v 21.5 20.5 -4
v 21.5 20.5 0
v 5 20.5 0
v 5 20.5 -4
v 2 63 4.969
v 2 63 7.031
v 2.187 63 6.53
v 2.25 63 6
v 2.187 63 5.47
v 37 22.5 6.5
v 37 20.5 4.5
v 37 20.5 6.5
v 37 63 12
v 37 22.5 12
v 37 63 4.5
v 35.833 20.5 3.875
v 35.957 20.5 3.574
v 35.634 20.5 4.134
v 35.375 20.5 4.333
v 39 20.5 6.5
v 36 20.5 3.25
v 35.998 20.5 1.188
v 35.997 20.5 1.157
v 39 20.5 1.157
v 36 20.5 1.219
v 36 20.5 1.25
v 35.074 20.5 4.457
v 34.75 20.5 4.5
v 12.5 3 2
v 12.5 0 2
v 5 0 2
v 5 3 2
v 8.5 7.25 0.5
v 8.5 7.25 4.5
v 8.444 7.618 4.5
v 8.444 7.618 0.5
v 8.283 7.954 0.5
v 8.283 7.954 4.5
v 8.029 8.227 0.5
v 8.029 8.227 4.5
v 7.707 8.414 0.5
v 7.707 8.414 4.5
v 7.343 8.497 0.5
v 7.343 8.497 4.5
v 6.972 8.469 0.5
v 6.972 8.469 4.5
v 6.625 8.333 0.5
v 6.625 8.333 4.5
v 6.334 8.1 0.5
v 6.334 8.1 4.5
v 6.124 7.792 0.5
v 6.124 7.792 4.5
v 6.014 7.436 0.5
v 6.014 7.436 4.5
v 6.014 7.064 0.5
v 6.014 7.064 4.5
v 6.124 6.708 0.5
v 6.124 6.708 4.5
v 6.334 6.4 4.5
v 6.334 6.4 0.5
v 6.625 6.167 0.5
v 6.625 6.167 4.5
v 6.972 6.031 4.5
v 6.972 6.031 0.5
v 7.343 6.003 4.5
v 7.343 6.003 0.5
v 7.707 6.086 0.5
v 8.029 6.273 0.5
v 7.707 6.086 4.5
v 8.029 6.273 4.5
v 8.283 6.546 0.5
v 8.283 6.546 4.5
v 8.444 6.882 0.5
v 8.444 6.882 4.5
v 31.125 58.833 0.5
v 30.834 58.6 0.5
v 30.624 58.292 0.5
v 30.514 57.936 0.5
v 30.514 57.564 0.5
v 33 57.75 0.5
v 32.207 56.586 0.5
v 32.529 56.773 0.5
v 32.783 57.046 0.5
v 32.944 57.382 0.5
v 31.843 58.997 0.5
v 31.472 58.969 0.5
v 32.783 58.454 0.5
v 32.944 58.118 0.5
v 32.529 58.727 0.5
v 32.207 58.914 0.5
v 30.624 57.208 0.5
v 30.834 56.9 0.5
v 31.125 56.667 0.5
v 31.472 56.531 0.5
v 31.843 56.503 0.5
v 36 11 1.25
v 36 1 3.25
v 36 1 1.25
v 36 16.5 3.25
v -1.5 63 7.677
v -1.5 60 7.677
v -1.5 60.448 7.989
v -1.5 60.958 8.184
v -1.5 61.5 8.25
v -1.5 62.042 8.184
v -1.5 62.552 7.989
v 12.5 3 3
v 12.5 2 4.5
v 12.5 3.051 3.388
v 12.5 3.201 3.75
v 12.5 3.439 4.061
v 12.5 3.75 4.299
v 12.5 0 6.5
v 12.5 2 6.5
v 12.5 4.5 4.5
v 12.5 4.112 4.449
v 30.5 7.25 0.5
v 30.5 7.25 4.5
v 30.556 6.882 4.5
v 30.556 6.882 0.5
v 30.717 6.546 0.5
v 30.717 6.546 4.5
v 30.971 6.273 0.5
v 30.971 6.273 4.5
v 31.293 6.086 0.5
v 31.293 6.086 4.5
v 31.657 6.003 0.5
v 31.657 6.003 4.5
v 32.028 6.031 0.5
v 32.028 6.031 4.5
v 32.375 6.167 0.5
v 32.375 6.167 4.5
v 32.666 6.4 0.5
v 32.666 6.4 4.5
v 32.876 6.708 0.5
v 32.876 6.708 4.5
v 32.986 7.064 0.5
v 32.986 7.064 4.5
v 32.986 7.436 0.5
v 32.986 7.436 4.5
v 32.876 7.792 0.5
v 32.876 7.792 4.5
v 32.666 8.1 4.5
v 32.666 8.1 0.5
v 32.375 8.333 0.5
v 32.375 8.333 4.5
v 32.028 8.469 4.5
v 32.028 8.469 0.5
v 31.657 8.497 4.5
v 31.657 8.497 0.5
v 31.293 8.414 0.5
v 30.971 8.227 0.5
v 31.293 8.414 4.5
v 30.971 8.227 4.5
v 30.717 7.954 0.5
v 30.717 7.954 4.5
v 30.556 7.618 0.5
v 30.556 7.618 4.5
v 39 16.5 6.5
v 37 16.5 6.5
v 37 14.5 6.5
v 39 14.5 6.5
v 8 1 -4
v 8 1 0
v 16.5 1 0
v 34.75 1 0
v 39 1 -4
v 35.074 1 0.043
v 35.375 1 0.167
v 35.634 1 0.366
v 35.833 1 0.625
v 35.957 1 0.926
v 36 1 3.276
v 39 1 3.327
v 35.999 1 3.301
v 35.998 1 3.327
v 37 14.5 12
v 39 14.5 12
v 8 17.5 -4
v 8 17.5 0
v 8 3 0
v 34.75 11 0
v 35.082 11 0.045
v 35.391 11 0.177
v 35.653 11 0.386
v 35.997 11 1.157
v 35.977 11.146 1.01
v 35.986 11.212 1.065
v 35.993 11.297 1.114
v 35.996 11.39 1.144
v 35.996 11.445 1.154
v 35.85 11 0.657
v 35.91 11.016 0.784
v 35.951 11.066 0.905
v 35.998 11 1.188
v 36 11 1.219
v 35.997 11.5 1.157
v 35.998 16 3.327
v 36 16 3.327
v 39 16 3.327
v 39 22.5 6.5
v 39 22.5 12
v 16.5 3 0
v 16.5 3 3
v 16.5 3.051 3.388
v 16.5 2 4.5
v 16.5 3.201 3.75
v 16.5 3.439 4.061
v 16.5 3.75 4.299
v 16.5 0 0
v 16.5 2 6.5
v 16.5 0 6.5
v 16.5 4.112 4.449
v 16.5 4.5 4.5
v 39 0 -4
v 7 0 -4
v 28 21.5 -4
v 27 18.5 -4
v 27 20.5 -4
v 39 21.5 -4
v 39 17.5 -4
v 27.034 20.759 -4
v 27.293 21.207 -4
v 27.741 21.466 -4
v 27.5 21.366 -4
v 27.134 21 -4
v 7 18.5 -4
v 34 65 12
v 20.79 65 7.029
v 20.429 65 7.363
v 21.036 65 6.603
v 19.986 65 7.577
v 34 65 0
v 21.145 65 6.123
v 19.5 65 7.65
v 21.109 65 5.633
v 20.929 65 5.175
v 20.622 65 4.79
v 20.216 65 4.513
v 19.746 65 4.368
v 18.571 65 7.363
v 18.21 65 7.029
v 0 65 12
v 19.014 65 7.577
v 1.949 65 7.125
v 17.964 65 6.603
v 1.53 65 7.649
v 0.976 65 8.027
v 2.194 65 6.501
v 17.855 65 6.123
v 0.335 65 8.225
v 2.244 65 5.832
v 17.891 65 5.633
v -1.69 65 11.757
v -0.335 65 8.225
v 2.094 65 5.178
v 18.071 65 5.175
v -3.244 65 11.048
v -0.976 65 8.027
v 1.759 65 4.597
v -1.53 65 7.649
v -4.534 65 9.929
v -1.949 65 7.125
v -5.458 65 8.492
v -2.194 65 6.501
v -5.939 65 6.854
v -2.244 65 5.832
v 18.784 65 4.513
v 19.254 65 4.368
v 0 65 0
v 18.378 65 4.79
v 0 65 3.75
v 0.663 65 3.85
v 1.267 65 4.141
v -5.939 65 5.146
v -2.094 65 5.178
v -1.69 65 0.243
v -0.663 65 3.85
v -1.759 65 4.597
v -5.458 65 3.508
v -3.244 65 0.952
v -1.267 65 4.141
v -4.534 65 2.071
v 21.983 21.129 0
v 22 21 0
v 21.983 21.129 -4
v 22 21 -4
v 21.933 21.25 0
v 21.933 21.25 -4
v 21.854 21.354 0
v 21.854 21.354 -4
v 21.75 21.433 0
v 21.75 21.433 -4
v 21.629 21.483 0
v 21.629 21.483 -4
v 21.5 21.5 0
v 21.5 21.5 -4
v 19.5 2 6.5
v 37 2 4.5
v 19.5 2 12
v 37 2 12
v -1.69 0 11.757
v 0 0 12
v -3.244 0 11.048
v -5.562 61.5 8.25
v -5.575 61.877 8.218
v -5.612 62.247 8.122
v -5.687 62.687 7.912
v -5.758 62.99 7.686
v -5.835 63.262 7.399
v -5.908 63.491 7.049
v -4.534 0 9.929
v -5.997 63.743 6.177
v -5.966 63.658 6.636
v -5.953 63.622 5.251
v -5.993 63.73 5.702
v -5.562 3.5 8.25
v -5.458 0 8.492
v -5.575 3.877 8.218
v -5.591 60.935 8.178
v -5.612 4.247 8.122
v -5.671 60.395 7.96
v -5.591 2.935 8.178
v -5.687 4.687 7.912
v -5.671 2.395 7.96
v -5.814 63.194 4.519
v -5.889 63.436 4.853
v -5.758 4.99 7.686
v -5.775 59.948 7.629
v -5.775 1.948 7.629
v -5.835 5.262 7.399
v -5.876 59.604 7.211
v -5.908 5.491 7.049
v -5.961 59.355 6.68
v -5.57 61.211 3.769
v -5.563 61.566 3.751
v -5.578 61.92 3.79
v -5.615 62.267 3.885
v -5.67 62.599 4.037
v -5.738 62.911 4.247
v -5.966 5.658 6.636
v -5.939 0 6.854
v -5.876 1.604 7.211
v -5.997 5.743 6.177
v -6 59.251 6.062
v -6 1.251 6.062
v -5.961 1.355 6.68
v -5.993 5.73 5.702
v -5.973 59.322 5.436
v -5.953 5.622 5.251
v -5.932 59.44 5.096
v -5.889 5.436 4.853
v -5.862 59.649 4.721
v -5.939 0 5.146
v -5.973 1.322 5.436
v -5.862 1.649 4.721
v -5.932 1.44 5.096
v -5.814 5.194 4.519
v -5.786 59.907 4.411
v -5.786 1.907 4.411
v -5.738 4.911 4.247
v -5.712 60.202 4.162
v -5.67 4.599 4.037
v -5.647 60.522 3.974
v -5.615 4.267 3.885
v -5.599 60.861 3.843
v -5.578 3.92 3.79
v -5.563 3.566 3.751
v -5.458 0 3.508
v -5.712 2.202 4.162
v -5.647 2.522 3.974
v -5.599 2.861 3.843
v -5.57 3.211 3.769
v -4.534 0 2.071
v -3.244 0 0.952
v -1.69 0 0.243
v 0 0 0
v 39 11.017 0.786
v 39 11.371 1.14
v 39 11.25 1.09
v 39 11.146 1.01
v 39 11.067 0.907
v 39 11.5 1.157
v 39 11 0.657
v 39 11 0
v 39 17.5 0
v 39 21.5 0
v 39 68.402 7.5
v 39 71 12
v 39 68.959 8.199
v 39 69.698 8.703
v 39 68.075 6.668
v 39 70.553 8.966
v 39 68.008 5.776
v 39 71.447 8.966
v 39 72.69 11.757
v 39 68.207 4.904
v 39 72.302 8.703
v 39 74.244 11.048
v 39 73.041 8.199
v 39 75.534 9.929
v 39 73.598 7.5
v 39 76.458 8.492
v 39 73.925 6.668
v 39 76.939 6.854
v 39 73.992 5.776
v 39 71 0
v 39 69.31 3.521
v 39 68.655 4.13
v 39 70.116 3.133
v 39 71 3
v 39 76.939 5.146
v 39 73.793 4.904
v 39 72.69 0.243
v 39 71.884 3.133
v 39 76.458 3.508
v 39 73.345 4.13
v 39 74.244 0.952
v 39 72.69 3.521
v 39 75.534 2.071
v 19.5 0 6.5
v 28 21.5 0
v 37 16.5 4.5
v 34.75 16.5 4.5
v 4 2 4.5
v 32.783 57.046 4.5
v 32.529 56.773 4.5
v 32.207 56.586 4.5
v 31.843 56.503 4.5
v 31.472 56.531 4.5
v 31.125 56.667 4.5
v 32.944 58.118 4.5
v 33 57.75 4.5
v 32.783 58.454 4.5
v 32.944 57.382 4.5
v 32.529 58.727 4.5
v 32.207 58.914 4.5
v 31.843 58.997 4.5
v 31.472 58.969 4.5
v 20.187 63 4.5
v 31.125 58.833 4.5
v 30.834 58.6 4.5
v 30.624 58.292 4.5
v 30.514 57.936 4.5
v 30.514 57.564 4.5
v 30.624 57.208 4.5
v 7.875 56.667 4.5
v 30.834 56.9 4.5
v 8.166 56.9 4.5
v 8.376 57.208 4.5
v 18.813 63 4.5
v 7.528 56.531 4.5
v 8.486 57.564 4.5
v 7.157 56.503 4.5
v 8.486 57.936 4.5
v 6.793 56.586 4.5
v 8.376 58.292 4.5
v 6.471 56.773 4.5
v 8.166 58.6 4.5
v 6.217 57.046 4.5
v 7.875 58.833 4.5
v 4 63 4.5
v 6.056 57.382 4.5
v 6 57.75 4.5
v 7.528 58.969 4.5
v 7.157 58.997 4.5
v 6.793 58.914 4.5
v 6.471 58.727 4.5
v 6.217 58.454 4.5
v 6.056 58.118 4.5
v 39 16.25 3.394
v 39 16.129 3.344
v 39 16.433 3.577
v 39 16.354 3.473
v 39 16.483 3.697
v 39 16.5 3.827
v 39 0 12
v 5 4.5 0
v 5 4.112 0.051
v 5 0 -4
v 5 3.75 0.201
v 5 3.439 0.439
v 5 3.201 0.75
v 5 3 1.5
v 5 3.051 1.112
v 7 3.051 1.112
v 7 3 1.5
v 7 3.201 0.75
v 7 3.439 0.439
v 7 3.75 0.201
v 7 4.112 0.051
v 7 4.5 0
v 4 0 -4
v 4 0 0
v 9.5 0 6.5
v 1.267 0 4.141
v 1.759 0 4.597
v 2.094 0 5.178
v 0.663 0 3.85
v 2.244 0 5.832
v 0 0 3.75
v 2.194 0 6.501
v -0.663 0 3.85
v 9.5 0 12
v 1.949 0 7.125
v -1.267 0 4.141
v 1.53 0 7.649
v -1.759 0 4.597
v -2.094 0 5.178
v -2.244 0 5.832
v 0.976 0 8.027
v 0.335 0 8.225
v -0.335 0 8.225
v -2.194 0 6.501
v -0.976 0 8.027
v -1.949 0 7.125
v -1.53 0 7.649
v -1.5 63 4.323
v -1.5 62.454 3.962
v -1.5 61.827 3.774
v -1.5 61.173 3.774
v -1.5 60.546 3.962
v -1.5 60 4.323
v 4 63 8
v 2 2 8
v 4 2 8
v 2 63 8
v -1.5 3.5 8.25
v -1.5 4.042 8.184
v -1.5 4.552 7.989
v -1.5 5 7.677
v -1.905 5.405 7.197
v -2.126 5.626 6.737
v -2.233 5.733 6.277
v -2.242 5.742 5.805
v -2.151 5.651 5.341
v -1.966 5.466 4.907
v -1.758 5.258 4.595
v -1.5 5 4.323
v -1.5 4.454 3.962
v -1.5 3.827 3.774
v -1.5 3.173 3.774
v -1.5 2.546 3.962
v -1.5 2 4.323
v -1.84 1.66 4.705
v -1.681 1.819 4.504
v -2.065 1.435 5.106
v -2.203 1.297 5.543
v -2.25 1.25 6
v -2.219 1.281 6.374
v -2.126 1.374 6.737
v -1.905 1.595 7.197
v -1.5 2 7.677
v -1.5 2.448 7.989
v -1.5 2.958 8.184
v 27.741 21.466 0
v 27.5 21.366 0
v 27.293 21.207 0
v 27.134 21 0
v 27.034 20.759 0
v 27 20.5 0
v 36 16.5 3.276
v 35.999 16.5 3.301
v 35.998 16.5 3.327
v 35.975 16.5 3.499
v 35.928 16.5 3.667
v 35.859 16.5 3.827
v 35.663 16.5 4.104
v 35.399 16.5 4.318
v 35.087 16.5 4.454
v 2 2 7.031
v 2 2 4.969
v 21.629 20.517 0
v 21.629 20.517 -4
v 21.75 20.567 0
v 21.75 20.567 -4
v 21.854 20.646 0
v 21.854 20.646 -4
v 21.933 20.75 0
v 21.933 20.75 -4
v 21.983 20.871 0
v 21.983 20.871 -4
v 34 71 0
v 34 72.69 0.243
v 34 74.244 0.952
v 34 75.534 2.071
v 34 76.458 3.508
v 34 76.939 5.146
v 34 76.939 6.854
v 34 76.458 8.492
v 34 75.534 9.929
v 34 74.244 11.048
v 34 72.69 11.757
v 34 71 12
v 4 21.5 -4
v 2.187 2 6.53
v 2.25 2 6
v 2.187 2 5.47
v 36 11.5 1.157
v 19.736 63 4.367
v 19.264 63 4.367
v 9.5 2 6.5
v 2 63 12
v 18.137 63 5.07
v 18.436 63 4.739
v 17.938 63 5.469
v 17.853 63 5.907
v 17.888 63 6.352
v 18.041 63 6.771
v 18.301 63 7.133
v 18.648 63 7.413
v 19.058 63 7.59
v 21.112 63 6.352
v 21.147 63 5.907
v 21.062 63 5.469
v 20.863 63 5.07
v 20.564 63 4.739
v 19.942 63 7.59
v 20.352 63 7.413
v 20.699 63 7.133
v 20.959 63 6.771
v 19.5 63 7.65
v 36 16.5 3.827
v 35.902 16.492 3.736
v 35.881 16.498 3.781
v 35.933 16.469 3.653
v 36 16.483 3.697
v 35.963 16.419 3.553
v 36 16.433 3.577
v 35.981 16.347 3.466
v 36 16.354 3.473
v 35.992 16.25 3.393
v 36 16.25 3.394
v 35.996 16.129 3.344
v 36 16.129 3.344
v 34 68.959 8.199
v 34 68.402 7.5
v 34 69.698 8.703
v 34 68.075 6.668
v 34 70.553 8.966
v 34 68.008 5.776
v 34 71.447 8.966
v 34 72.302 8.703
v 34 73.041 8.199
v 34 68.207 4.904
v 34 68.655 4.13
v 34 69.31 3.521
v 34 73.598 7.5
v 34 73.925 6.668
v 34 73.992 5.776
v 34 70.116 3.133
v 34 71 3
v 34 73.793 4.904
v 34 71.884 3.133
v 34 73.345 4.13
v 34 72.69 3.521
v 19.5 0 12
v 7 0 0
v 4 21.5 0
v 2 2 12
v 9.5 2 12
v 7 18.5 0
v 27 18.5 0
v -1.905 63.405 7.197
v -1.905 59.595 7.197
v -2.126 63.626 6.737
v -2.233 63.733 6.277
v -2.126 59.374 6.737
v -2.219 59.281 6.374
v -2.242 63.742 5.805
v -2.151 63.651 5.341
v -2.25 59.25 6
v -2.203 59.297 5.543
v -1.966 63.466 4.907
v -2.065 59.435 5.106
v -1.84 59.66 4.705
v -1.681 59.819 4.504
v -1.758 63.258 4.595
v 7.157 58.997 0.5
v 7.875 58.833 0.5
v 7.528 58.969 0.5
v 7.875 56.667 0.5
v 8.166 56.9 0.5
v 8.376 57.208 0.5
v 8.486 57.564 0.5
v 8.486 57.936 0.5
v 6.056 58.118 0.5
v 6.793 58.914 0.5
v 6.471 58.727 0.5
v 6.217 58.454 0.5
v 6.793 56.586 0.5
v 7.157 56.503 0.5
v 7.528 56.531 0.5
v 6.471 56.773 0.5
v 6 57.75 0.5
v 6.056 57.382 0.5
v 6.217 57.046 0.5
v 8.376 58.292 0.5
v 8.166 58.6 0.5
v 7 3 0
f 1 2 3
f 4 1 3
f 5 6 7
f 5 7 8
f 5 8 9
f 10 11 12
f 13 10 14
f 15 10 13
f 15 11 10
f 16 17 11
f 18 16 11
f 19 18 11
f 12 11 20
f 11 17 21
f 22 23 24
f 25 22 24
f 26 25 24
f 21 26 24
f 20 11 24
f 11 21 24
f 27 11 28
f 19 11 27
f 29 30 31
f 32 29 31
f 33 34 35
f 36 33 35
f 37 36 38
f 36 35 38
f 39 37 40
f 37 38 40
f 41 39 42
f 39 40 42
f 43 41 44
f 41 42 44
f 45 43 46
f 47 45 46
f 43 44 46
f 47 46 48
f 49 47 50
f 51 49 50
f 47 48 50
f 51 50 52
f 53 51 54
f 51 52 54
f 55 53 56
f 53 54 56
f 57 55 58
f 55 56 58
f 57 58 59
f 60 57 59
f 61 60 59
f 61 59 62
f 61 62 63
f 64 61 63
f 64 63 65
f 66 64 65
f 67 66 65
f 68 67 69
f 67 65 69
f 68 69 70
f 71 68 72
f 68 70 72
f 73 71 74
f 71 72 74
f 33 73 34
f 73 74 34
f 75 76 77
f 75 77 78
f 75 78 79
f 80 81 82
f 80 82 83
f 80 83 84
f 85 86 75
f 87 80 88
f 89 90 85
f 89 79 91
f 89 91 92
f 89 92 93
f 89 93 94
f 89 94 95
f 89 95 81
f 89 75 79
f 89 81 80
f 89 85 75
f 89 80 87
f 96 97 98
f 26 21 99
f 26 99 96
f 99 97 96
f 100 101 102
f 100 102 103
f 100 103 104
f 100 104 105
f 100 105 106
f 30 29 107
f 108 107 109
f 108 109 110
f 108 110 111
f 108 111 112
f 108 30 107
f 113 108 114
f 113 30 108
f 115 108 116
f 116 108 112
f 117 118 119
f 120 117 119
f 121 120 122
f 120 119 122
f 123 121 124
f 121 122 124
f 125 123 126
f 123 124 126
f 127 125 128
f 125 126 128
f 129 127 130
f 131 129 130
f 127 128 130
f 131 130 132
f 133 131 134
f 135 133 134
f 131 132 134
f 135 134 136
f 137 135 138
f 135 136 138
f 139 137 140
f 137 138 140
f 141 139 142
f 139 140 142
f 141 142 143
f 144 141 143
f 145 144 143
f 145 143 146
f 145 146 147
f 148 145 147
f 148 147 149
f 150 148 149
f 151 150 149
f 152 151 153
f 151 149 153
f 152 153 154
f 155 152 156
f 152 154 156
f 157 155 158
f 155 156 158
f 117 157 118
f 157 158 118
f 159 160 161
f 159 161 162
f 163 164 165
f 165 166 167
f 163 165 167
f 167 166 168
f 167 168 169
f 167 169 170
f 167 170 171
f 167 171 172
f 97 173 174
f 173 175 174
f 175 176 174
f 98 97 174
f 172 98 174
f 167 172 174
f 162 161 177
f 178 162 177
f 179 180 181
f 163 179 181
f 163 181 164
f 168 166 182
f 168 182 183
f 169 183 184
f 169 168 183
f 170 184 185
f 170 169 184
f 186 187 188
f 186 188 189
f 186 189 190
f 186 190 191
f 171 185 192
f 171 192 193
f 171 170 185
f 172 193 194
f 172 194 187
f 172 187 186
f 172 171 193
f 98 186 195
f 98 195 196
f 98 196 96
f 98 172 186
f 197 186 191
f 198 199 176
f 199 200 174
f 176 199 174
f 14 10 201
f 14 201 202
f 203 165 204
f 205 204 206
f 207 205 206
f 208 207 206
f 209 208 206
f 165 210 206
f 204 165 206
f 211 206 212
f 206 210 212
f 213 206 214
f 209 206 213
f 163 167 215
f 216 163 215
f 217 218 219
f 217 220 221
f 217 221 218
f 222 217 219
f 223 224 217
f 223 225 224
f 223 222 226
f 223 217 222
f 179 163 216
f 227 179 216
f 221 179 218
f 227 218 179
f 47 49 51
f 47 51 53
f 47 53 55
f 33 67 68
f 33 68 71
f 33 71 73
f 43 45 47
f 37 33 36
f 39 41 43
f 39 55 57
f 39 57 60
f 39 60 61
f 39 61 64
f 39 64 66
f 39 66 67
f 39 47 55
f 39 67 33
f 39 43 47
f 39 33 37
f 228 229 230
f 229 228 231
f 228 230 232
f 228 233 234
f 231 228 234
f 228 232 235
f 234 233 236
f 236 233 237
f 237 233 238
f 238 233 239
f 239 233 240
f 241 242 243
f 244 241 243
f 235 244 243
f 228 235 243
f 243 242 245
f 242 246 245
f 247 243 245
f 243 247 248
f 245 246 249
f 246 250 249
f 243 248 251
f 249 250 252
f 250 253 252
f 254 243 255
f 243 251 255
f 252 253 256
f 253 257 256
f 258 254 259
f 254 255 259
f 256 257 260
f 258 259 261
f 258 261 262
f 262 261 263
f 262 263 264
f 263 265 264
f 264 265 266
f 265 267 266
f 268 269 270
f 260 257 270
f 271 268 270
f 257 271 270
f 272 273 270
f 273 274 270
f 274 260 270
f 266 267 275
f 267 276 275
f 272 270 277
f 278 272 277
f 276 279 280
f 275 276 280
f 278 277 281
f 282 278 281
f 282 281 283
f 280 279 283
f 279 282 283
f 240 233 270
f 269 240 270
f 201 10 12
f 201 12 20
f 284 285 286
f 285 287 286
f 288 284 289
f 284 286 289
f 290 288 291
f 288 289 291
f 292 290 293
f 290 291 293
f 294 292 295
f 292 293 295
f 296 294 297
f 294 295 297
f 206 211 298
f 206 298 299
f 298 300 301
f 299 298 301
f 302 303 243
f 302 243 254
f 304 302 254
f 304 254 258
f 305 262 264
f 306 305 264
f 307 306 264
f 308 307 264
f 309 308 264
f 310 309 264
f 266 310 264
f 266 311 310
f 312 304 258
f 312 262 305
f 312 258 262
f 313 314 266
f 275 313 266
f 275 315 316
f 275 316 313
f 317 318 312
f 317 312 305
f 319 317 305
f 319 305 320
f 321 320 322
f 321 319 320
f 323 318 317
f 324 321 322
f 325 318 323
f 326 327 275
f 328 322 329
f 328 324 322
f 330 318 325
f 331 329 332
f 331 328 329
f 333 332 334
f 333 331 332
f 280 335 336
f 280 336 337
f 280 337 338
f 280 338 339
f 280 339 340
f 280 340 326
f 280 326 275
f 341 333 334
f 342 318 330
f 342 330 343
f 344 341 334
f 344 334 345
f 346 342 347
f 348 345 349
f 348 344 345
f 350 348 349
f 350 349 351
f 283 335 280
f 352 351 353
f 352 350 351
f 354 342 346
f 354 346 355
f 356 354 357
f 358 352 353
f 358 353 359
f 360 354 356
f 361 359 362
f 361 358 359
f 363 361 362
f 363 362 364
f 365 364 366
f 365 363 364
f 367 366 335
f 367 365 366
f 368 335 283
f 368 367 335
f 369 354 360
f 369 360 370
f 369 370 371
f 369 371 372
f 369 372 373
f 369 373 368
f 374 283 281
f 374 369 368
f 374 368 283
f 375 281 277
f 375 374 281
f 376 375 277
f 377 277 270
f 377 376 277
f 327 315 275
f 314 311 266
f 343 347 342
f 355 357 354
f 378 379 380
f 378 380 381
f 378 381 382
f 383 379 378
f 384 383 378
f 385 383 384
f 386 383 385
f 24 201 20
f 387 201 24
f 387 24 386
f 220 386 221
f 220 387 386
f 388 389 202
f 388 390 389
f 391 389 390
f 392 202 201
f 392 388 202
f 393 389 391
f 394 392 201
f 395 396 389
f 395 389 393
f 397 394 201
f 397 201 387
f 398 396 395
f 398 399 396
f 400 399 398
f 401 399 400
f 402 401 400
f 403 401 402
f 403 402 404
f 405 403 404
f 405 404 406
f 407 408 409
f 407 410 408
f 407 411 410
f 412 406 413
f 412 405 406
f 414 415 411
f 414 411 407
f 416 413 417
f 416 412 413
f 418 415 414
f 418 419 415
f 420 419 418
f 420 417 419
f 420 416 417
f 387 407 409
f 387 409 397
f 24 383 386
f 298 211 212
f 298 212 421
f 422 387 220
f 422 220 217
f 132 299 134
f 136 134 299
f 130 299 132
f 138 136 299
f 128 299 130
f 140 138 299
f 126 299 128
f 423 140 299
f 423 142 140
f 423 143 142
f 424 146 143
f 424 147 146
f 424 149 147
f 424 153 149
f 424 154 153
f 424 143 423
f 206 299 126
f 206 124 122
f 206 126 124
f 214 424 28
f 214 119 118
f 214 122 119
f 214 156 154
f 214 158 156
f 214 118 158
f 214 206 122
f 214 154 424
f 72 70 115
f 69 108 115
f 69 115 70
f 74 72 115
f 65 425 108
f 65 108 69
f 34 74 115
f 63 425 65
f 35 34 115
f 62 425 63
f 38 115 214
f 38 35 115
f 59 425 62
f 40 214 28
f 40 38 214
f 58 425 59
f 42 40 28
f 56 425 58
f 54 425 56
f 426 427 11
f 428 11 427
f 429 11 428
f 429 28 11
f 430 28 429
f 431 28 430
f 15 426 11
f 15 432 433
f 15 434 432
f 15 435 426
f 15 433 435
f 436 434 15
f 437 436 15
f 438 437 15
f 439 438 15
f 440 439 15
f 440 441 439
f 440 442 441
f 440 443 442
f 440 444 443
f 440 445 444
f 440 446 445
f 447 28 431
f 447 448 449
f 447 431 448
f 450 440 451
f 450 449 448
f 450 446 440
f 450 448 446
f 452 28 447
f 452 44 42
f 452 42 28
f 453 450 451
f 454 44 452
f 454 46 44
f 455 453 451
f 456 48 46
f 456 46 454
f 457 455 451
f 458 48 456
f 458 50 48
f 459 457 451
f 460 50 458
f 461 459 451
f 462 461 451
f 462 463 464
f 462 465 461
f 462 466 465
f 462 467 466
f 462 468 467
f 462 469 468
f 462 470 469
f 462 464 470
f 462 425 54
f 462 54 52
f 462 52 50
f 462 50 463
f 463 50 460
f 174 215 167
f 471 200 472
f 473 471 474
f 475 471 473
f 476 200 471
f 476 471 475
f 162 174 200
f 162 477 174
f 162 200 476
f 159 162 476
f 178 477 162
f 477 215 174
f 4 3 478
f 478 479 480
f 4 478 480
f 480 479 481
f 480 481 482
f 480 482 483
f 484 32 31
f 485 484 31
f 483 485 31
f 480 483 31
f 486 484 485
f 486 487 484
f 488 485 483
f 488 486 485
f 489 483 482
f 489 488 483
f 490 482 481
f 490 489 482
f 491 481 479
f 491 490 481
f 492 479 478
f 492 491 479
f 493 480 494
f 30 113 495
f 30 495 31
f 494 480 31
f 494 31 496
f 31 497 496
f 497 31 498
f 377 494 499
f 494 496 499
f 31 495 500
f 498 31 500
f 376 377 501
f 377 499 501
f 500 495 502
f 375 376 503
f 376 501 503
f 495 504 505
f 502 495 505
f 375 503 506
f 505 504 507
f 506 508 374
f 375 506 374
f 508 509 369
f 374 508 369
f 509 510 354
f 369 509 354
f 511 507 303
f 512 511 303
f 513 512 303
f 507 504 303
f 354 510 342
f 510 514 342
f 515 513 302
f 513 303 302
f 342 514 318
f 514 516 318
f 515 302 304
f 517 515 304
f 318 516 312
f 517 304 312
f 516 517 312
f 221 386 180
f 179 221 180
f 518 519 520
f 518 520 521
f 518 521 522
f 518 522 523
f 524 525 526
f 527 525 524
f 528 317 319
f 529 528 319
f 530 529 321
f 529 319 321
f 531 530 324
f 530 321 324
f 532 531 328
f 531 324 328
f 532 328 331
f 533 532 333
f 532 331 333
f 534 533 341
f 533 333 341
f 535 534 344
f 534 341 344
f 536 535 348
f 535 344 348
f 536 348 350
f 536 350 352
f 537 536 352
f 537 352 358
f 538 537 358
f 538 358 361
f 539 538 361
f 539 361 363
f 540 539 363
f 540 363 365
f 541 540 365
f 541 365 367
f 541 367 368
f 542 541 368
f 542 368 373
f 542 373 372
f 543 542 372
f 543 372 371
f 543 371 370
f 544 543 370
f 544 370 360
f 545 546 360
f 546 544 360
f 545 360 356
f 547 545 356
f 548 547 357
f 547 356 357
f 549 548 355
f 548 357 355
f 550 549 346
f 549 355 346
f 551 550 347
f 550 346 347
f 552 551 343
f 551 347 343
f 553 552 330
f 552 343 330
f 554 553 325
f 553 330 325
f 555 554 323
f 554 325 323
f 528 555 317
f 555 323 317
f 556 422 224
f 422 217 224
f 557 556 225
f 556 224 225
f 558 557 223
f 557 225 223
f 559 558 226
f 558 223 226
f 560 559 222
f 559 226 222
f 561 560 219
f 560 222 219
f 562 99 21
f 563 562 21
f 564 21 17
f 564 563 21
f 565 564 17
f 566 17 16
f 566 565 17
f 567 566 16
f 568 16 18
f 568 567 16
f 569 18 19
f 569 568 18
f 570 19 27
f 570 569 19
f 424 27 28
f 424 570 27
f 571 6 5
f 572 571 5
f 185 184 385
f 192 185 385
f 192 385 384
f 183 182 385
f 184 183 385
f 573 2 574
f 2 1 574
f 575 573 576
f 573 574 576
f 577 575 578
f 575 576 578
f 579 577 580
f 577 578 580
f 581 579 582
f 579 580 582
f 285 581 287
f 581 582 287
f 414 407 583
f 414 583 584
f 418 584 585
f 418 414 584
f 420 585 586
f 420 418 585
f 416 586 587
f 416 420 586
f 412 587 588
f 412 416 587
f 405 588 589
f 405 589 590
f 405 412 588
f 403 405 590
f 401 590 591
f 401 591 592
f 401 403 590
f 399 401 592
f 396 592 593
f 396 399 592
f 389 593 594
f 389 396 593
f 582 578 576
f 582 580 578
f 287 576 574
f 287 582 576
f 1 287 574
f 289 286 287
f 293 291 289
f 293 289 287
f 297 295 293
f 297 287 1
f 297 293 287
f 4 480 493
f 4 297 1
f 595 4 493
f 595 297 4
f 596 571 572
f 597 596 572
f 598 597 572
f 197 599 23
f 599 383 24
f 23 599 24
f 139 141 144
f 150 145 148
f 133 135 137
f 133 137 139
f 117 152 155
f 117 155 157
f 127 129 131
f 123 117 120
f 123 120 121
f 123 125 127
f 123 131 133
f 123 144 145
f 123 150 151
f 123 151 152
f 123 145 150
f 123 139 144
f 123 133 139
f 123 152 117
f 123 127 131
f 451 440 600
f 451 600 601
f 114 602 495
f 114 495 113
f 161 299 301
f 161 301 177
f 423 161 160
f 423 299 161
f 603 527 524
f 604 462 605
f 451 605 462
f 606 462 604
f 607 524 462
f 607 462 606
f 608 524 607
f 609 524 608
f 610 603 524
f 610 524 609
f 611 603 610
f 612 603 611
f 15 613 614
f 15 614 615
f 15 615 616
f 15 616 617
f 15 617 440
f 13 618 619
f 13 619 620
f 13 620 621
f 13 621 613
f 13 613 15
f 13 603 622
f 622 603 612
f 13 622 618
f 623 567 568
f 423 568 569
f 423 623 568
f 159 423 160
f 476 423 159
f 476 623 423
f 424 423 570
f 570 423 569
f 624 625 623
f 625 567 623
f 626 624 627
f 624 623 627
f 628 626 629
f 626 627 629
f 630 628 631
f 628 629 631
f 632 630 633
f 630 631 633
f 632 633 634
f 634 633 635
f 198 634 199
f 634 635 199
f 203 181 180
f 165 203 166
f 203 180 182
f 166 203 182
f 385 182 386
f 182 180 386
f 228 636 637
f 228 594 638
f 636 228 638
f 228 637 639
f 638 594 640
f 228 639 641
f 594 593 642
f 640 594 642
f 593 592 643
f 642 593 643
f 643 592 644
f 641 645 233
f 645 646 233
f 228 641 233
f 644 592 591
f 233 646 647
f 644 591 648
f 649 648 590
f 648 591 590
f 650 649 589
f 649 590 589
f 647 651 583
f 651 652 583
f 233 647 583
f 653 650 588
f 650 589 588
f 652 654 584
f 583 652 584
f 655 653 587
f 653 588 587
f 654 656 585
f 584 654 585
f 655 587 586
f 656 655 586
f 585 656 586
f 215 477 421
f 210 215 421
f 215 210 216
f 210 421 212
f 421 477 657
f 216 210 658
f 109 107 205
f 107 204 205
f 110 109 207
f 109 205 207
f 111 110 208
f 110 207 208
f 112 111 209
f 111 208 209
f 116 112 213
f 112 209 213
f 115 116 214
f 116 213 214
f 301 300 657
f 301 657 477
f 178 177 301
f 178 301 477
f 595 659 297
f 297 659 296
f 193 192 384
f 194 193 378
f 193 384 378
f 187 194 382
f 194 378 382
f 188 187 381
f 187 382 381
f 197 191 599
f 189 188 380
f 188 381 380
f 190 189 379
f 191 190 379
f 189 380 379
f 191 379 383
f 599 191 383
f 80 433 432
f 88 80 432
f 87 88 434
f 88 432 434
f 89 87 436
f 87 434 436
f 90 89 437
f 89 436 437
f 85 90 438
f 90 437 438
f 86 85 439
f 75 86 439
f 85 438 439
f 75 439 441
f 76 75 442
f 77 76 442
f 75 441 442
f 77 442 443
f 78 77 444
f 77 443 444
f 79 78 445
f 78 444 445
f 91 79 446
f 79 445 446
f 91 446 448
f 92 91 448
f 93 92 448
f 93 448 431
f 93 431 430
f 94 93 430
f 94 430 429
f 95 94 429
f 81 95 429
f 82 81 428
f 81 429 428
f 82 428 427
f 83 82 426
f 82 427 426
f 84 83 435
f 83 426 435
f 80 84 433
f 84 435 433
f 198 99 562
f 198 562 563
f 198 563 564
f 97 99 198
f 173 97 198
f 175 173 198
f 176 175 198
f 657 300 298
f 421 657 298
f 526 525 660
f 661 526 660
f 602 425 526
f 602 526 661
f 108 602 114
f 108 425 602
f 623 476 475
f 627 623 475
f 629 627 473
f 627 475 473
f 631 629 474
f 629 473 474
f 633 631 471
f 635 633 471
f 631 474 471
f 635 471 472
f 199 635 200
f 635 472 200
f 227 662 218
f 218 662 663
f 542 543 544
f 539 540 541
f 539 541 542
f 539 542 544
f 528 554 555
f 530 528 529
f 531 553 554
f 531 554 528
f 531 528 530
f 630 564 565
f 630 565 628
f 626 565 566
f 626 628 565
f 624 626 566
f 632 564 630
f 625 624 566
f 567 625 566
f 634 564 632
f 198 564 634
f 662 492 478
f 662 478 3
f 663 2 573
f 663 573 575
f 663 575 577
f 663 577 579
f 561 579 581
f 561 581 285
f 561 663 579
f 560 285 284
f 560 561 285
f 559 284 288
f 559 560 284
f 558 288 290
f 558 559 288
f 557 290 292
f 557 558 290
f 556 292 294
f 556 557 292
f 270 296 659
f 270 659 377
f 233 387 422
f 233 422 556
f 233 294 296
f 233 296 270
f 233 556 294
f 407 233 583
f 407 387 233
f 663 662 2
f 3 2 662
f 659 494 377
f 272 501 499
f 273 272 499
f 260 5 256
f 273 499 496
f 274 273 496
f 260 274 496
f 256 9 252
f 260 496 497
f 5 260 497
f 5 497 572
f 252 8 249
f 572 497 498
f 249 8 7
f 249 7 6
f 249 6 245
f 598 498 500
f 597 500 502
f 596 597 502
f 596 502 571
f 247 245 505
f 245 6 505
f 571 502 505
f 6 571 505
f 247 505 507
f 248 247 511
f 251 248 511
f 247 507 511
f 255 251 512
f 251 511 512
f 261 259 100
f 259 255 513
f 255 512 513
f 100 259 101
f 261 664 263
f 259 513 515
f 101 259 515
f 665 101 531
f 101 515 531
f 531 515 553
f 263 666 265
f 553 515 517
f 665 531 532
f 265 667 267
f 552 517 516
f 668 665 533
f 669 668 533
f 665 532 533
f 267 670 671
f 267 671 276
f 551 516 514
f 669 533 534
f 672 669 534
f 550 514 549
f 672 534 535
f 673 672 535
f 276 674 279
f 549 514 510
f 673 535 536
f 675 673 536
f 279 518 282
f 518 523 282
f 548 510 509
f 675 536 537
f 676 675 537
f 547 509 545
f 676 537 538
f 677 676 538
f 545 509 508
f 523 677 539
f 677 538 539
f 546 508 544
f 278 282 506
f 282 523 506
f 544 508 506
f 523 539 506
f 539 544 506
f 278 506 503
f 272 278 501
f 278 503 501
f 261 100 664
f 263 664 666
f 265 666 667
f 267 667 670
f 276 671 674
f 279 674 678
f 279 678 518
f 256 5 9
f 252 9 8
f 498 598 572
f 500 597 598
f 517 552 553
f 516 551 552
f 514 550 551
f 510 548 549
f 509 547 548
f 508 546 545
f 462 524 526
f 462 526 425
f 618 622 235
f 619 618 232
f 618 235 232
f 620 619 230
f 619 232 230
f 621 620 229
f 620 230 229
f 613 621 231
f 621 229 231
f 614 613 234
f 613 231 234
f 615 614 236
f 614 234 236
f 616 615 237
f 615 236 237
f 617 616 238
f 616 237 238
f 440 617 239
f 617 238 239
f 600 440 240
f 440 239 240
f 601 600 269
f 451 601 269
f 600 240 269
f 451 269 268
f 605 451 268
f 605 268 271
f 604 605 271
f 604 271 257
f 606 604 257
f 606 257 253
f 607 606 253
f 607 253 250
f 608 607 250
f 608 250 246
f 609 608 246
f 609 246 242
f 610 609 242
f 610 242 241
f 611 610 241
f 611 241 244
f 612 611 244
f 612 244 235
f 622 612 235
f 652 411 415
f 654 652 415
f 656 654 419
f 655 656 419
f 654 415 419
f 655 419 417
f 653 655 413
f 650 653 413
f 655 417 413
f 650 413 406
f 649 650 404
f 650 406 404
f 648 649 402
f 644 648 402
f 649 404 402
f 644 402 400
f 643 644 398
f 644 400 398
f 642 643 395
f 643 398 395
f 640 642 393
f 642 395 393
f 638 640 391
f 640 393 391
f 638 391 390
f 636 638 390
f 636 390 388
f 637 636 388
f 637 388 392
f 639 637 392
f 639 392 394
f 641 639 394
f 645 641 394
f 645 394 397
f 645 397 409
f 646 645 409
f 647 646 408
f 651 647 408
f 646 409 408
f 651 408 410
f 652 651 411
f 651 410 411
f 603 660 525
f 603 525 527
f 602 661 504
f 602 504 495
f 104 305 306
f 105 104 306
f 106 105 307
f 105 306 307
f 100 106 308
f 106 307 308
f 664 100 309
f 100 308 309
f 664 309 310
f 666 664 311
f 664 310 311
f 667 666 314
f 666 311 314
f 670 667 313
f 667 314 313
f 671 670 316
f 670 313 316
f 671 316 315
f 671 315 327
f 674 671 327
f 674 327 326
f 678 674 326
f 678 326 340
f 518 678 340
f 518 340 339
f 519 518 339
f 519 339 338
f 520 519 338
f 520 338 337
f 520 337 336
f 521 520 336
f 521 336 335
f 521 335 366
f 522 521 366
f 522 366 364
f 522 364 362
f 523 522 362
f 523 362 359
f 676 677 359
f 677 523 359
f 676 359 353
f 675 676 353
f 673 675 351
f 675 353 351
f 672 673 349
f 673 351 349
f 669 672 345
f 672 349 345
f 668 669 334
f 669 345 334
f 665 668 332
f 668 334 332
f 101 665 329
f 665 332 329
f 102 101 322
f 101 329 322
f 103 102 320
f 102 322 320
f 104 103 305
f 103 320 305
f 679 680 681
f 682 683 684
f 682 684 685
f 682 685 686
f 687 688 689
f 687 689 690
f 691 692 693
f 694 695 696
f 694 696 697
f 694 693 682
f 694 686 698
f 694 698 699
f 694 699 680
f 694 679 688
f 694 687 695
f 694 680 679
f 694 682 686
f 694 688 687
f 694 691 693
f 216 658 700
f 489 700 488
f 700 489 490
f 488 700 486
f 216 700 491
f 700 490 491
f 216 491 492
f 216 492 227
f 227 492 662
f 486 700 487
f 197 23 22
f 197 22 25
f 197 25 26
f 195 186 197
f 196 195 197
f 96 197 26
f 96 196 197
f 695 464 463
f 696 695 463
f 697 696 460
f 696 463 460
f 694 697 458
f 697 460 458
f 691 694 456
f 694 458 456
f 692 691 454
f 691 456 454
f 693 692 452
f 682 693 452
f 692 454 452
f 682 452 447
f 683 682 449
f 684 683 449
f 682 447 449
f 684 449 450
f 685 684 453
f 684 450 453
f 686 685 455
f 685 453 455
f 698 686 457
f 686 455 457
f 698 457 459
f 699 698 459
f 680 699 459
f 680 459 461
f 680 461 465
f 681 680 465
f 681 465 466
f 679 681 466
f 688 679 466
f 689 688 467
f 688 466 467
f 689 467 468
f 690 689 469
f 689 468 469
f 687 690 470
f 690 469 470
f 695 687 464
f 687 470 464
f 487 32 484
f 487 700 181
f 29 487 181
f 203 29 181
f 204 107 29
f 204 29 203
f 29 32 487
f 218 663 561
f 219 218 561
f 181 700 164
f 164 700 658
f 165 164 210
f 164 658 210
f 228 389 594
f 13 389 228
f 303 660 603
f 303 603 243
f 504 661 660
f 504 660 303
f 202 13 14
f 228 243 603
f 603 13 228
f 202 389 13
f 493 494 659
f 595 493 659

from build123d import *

# Parameters (mm, degrees)
SKETCH1_W                = 39
SKETCH1_H                = 65
BASE_DEPTH               = 4.5
SKETCH2_W                = 4
SKETCH2_H                = 57
WALLS_DEPTH              = 7.5
SKETCH3_W                = 10
SKETCH3_H                = 7.5
PWR_CONNECTOR_HOLE_DEPTH = 4
SKETCH4_W                = 7.5
SKETCH4_H                = 8
GPS_CONNECTOR_HOLE_DEPTH = 4
SKETCH5_R                = 1.25
MOUNTING_HOLES_DEPTH     = 4
GPS_MOUNT_DEPTH          = 4
SKETCH11_W               = 17
SKETCH11_H               = 1
SKETCH11_W_2             = 12
SKETCH11_H_2             = 3
PWR_CABLE_HOLDER1_DEPTH  = 4
SKETCH12_W               = 4
SKETCH12_H               = 2.5
PWR_CABLE_HOLDER2_DEPTH  = 3
PWR_FILLET_R             = 1.5
PWR_FILLET2_R            = 1
PWR_FILLET3_R            = 0.5
GPS_CABLE_HOLDER_DEPTH   = 3
GPS_START                = 1
GPS_FILLET_DEPTH         = 10
GPS_START_2              = 16.5
GPS_FILLET_2_DEPTH       = 4
GPS_START_3              = 9.15727
GPS_FILLET_3_DEPTH       = 8.34273
GPS_FILLET2_R            = 0.5
SKETCH15_R               = 6
BALLON_MOUNT_DEPTH       = 65
SKETCH16_R               = 2.25
BALLOON_MOUNT_HOLE_DEPTH = 65
SKETCH21_R               = 2.25
SAFETY_MOUNT_DEPTH       = 4.5
SKETCH22_W               = 35
SKETCH22_H               = 61
LID_HOLE_DEPTH           = 7.5
SKETCH25_W               = 3.5
SKETCH25_H               = 61
CORRECTION_DEPTH         = 2
SKETCH28_W               = 2
SKETCH28_H               = 2
SKETCH28_W_2             = 3
SMALL_WALLS_DEPTH        = 2
ANTENNA_MOUNTING_DEPTH   = 5
SKETCH30_R               = 3
ANTENNA_HOLE_DEPTH       = 5
SKETCH31_R               = 1.65
CABLE_HOLE_DEPTH         = 2


with BuildPart() as part:
    # Sketch1 → Base (new body)
    with BuildSketch(Plane.XY):
        with Locations((19.5, 32.5)):
            Rectangle(SKETCH1_W, SKETCH1_H)
    extrude(amount=BASE_DEPTH)

    # Sketch2 → Walls (add)
    with BuildSketch(Plane.XY.offset(4.5)):
        Polygon((39, 61), (39, 65), (0, 65), (0, 61), (4, 61), (35, 61), align=None)
        with Locations((37, 32.5)):
            Rectangle(SKETCH2_W, SKETCH2_H)
        Polygon((4, 61), (0, 61), (0, 0), (4, 0), (4, 4), align=None)
        Polygon((39, 0), (39, 4), (35, 4), (4, 4), (4, 0), align=None)
    extrude(amount=WALLS_DEPTH)

    # Sketch3 → PWR connector hole (cut)
    with BuildSketch(Plane(origin=(0, 4, 0), x_dir=(1, 0, 0), z_dir=(0, 1, 0))):
        with Locations((14.5, -8.25)):
            Rectangle(SKETCH3_W, SKETCH3_H)
    extrude(amount=-PWR_CONNECTOR_HOLE_DEPTH, mode=Mode.SUBTRACT)

    # Sketch4 → GPS connector hole (cut)
    with BuildSketch(Plane.ZY.offset(-35)):
        with Locations((8.25, 18.5)):
            Rectangle(SKETCH4_W, SKETCH4_H)
    extrude(amount=-GPS_CONNECTOR_HOLE_DEPTH, mode=Mode.SUBTRACT)

    # Sketch5 → Mounting holes (cut)
    with BuildSketch(Plane.XY.offset(4.5)):
        with Locations((7.25, 7.25)):
            Circle(SKETCH5_R)
        with Locations(Location((31.75, 7.25, 0), (0, 0, 180))):
            Circle(SKETCH5_R)
        with Locations(Location((7.25, 57.75, 0), (0, 0, 180))):
            Circle(SKETCH5_R)
        with Locations((31.75, 57.75)):
            Circle(SKETCH5_R)
    extrude(amount=-MOUNTING_HOLES_DEPTH, mode=Mode.SUBTRACT)

    # Sketch7 → GPS mount (add)
    with BuildSketch(Plane(origin=(0, 0, 0), x_dir=(-1, 0, 0), z_dir=(0, 0, -1))):
        Polygon((-39, 1), (-39, 0), (-7, 0), (-7, 18.5), (-39, 18.5), (-39, 17.5), (-8, 17.5), (-8, 1), align=None)
    extrude(amount=GPS_MOUNT_DEPTH)

    # Sketch11 → PWR cable holder1 (add)
    with BuildSketch(Plane(origin=(0, 0, 0), x_dir=(-1, 0, 0), z_dir=(0, 0, -1))):
        Polygon((-5, 0), (-4, 0), (-4, 21.5), (-5, 21.5), (-5, 20.5), align=None)
        with Locations((-13.5, 21)):
            Rectangle(SKETCH11_W, SKETCH11_H)
        with Locations((-33, 20)):
            Rectangle(SKETCH11_W_2, SKETCH11_H_2)
    extrude(amount=PWR_CABLE_HOLDER1_DEPTH)

    # Sketch12 → PWR cable holder2 (cut)
    with BuildSketch(Plane.XZ):
        Polygon((5, 2), (5, 0), (7, 0), (16.5, 0), (16.5, 2), (12.5, 2), align=None)
        with Locations((14.5, 3.25)):
            Rectangle(SKETCH12_W, SKETCH12_H)
    extrude(amount=-PWR_CABLE_HOLDER2_DEPTH, mode=Mode.SUBTRACT)

    # PWR fillet
    pwr_fillet_edges = [part.edges().sort_by_distance(p)[0] for p in [
        (6, 3, 0),
        (14.5, 3, 4.5),
    ]]
    fillet(pwr_fillet_edges, radius=PWR_FILLET_R)

    # PWR fillet2
    pwr_fillet2_edges = [part.edges().sort_by_distance(p)[0] for p in [
        (27, 21.5, -2),
    ]]
    fillet(pwr_fillet2_edges, radius=PWR_FILLET2_R)

    # PWR fillet3
    pwr_fillet3_edges = [part.edges().sort_by_distance(p)[0] for p in [
        (22, 21.5, -2),
        (22, 20.5, -2),
    ]]
    fillet(pwr_fillet3_edges, radius=PWR_FILLET3_R - 0.0001)  # a hair under: the kernel refuses the full size

    # Sketch13 → GPS cable holder (cut)
    with BuildSketch(Plane(origin=(39, 0, 0), x_dir=(0, 0, -1), z_dir=(1, 0, 0))):
        Polygon((-1.156586719, 11), (-2.326586719, 11), (-2.326586719, 1), (0, 1), (0, 11), align=None)
        Polygon((-2.326586719, 11), (-2.326586719, 16.5), (-3.326586719, 16.5), (-3.326586719, 1), (-2.326586719, 1), align=None)
        Polygon((-1.156586719, 20.5), (-2.326586719, 20.5), (-2.326586719, 16.5), (-2.326586719, 11), (-1.156586719, 11), align=None)
        Polygon((-2.326586719, 20.5), (-4.5, 20.5), (-4.5, 16.5), (-3.326586719, 16.5), (-2.326586719, 16.5), align=None)
    extrude(amount=-GPS_CABLE_HOLDER_DEPTH, mode=Mode.SUBTRACT)

    # GPS fillet: read off the stored shape, not the designer's step
    # GPS fillet outline → GPS fillet (cut)
    with BuildSketch(Plane(origin=(0, 0, 0), x_dir=(1, 0, 0), z_dir=(0, 1, 0)).offset(GPS_START)):
        with BuildLine():
            Line((36, -3.326586719), (36, -3.25))
            ThreePointArc((36, -3.25), (35.999412758, -3.288311358), (35.997651584, -3.326586719))
            Line((35.997651584, -3.326586719), (36, -3.326586719))
        make_face()
        with BuildLine():
            Line((36, -1.25), (36, 0))
            Line((36, 0), (34.75, 0))
            ThreePointArc((34.75, 0), (35.633883476, -0.366116524), (36, -1.25))
        make_face()
    extrude(amount=GPS_FILLET_DEPTH, mode=Mode.SUBTRACT)

    # GPS fillet 2 outline → GPS fillet 2 (cut)
    with BuildSketch(Plane(origin=(0, 0, 0), x_dir=(1, 0, 0), z_dir=(0, 1, 0)).offset(GPS_START_2)):
        with BuildLine():
            ThreePointArc((36, -3.25), (35.633883476, -4.133883476), (34.75, -4.5))
            Line((34.75, -4.5), (36, -4.5))
            Line((36, -4.5), (36, -3.25))
        make_face()
        with BuildLine():
            ThreePointArc((35.996504697, -1.156586719), (35.999125868, -1.203260674), (36, -1.25))
            Line((36, -1.25), (36, -1.156586719))
            Line((36, -1.156586719), (35.996504697, -1.156586719))
        make_face()
    extrude(amount=GPS_FILLET_2_DEPTH, mode=Mode.SUBTRACT)

    # GPS fillet 3 outline → GPS fillet 3 (cut)
    with BuildSketch(Plane(origin=(0, 0, 0), x_dir=(1, 0, 0), z_dir=(0, 1, 0)).offset(GPS_START_3)):
        with BuildLine():
            Line((36, -3.326586719), (36, -3.25))
            ThreePointArc((36, -3.25), (35.999412758, -3.288311358), (35.997651584, -3.326586719))
            Line((35.997651584, -3.326586719), (36, -3.326586719))
        make_face()
        with BuildLine():
            ThreePointArc((35.996504697, -1.156586719), (35.999125868, -1.203260674), (36, -1.25))
            Line((36, -1.25), (36, -1.156586719))
            Line((36, -1.156586719), (35.996504697, -1.156586719))
        make_face()
    extrude(amount=GPS_FILLET_3_DEPTH, mode=Mode.SUBTRACT)

    # GPS fillet2
    # the kernel refuses this fillet: 0.5 mm, written as the material it takes off along each edge
    with BuildSketch(Plane(origin=(40.25, 11, 1.156586719), x_dir=(0, 0, -1), z_dir=(-1, 0, 0))) as gps_fillet2_piece_1:
        with BuildLine():
            CenterArc((GPS_FILLET2_R, -GPS_FILLET2_R), GPS_FILLET2_R, 90, 90)
            Line((0, -GPS_FILLET2_R), (0, 0))
            Line((0, 0), (GPS_FILLET2_R, 0))
        make_face()
    extrude(amount=4.25, mode=Mode.SUBTRACT)
    with BuildSketch(Plane(origin=(40.25, 16.5, 3.326586719), x_dir=(0, -1, 0), z_dir=(-1, 0, 0))) as gps_fillet2_piece_2:
        with BuildLine():
            CenterArc((GPS_FILLET2_R, GPS_FILLET2_R), GPS_FILLET2_R, 180, 90)
            Line((0, GPS_FILLET2_R), (0, 0))
            Line((0, 0), (GPS_FILLET2_R, 0))
        make_face()
    extrude(amount=4.25, mode=Mode.SUBTRACT)
    with BuildSketch(Plane(origin=(36, 16.5, 3.326586719), x_dir=(0, -1.0, 5.126796764898245e-10), z_dir=(-1, 0, 0))) as gps_fillet2_piece_3_section:
        with BuildLine():
            CenterArc((GPS_FILLET2_R, GPS_FILLET2_R), GPS_FILLET2_R, 179.999999971, 90)
            Line((GPS_FILLET2_R * 5.12679676753e-10, GPS_FILLET2_R), (0, 0))
            Line((0, 0), (GPS_FILLET2_R, 0))
        make_face()
    gps_fillet2_piece_3 = extrude(amount=1.252348417, mode=Mode.PRIVATE)
    gps_fillet2_piece_3 = gps_fillet2_piece_3 - Plane(origin=(34.749999755, 16.5, 3.249999996), x_dir=(1.0, 0, 2.949740140725451e-09), z_dir=(0, -1, 0)) * Cylinder(1.250000245, 5, mode=Mode.PRIVATE)
    add(gps_fillet2_piece_3, mode=Mode.SUBTRACT)
    with BuildSketch(Plane(origin=(34.746504697, 11, 1.156586719), x_dir=(0, 0, -1), z_dir=(1, 0, 0))) as gps_fillet2_piece_4_section:
        with BuildLine():
            CenterArc((GPS_FILLET2_R, GPS_FILLET2_R), GPS_FILLET2_R, 180, 90)
            Line((-GPS_FILLET2_R * 5.12674791509e-10, GPS_FILLET2_R), (0, 0))
            Line((0, 0), (GPS_FILLET2_R, 0))
        make_face()
    gps_fillet2_piece_4 = extrude(amount=1.253495303, mode=Mode.PRIVATE)
    gps_fillet2_piece_4 = gps_fillet2_piece_4 - Plane(origin=(34.749999998, 11, 1.250000002), x_dir=(1.3197563913171698e-09, 0, -1.0), z_dir=(0, -1, 0)) * Cylinder(1.250000002, 5, mode=Mode.PRIVATE)
    add(gps_fillet2_piece_4, mode=Mode.SUBTRACT)

    # Sketch15 → Ballon mount (add)
    with BuildSketch(Plane.XZ):
        with Locations((0, 6)):
            Circle(SKETCH15_R)
    extrude(amount=-BALLON_MOUNT_DEPTH)

    # Sketch16 → Balloon mount hole (cut)
    with BuildSketch(Plane.XZ):
        with Locations(Location((0, 6, 0), (0, 0, 270))):
            Circle(SKETCH16_R)
    extrude(amount=-BALLOON_MOUNT_HOLE_DEPTH, mode=Mode.SUBTRACT)

    # Sketch21 → Safety mount (cut)
    with BuildSketch(Plane.ZY.offset(6)):
        with Locations((6, 3.5)):
            Circle(SKETCH21_R)
        with Locations((6, 61.5)):
            Circle(SKETCH21_R)
    extrude(amount=-SAFETY_MOUNT_DEPTH, mode=Mode.SUBTRACT)

    # Sketch22 → Lid hole (cut)
    with BuildSketch(Plane.XY.offset(12)):
        with Locations((19.5, 32.5)):
            Rectangle(SKETCH22_W, SKETCH22_H)
    extrude(amount=-LID_HOLE_DEPTH, mode=Mode.SUBTRACT)

    # Sketch25 → Correction (add)
    with BuildSketch(Plane(origin=(2, 0, 0), x_dir=(0, 0, -1), z_dir=(1, 0, 0))):
        with Locations((-6.25, 32.5)):
            Rectangle(SKETCH25_W, SKETCH25_H)
    extrude(amount=CORRECTION_DEPTH)

    # Sketch28 → Small walls (add)
    with BuildSketch(Plane.XY.offset(4.5)):
        with Locations((38, 21.5)):
            Rectangle(SKETCH28_W, SKETCH28_H)
        with Locations((38, 15.5)):
            Rectangle(SKETCH28_W, SKETCH28_H)
        with Locations((18, 1)):
            Rectangle(SKETCH28_W_2, SKETCH28_H)
        with Locations((11, 1)):
            Rectangle(SKETCH28_W_2, SKETCH28_H)
    extrude(amount=SMALL_WALLS_DEPTH)

    # Sketch29 → Antenna mounting (add)
    with BuildSketch(Plane(origin=(39, 0, 0), x_dir=(0, 0, -1), z_dir=(1, 0, 0))):
        with BuildLine():
            Line((0, 65), (0, 71))
            ThreePointArc((0, 71), (-6, 77), (-12, 71))
            Line((-12, 71), (-12, 65))
            Line((-12, 65), (0, 65))
        make_face()
    extrude(amount=-ANTENNA_MOUNTING_DEPTH)

    # Sketch30 → Antenna hole (cut)
    with BuildSketch(Plane(origin=(39, 0, 0), x_dir=(0, 0, -1), z_dir=(1, 0, 0))):
        with Locations((-6, 71)):
            Circle(SKETCH30_R)
    extrude(amount=-ANTENNA_HOLE_DEPTH, mode=Mode.SUBTRACT)

    # Sketch31 → Cable hole (cut)
    with BuildSketch(Plane(origin=(0, 65, 0), x_dir=(1, 0, 0), z_dir=(0, 1, 0))):
        with Locations(Location((19.5, -6, 0), (0, 0, 270))):
            Circle(SKETCH31_R)
    extrude(amount=-CABLE_HOLE_DEPTH, mode=Mode.SUBTRACT)


solid = part.part
